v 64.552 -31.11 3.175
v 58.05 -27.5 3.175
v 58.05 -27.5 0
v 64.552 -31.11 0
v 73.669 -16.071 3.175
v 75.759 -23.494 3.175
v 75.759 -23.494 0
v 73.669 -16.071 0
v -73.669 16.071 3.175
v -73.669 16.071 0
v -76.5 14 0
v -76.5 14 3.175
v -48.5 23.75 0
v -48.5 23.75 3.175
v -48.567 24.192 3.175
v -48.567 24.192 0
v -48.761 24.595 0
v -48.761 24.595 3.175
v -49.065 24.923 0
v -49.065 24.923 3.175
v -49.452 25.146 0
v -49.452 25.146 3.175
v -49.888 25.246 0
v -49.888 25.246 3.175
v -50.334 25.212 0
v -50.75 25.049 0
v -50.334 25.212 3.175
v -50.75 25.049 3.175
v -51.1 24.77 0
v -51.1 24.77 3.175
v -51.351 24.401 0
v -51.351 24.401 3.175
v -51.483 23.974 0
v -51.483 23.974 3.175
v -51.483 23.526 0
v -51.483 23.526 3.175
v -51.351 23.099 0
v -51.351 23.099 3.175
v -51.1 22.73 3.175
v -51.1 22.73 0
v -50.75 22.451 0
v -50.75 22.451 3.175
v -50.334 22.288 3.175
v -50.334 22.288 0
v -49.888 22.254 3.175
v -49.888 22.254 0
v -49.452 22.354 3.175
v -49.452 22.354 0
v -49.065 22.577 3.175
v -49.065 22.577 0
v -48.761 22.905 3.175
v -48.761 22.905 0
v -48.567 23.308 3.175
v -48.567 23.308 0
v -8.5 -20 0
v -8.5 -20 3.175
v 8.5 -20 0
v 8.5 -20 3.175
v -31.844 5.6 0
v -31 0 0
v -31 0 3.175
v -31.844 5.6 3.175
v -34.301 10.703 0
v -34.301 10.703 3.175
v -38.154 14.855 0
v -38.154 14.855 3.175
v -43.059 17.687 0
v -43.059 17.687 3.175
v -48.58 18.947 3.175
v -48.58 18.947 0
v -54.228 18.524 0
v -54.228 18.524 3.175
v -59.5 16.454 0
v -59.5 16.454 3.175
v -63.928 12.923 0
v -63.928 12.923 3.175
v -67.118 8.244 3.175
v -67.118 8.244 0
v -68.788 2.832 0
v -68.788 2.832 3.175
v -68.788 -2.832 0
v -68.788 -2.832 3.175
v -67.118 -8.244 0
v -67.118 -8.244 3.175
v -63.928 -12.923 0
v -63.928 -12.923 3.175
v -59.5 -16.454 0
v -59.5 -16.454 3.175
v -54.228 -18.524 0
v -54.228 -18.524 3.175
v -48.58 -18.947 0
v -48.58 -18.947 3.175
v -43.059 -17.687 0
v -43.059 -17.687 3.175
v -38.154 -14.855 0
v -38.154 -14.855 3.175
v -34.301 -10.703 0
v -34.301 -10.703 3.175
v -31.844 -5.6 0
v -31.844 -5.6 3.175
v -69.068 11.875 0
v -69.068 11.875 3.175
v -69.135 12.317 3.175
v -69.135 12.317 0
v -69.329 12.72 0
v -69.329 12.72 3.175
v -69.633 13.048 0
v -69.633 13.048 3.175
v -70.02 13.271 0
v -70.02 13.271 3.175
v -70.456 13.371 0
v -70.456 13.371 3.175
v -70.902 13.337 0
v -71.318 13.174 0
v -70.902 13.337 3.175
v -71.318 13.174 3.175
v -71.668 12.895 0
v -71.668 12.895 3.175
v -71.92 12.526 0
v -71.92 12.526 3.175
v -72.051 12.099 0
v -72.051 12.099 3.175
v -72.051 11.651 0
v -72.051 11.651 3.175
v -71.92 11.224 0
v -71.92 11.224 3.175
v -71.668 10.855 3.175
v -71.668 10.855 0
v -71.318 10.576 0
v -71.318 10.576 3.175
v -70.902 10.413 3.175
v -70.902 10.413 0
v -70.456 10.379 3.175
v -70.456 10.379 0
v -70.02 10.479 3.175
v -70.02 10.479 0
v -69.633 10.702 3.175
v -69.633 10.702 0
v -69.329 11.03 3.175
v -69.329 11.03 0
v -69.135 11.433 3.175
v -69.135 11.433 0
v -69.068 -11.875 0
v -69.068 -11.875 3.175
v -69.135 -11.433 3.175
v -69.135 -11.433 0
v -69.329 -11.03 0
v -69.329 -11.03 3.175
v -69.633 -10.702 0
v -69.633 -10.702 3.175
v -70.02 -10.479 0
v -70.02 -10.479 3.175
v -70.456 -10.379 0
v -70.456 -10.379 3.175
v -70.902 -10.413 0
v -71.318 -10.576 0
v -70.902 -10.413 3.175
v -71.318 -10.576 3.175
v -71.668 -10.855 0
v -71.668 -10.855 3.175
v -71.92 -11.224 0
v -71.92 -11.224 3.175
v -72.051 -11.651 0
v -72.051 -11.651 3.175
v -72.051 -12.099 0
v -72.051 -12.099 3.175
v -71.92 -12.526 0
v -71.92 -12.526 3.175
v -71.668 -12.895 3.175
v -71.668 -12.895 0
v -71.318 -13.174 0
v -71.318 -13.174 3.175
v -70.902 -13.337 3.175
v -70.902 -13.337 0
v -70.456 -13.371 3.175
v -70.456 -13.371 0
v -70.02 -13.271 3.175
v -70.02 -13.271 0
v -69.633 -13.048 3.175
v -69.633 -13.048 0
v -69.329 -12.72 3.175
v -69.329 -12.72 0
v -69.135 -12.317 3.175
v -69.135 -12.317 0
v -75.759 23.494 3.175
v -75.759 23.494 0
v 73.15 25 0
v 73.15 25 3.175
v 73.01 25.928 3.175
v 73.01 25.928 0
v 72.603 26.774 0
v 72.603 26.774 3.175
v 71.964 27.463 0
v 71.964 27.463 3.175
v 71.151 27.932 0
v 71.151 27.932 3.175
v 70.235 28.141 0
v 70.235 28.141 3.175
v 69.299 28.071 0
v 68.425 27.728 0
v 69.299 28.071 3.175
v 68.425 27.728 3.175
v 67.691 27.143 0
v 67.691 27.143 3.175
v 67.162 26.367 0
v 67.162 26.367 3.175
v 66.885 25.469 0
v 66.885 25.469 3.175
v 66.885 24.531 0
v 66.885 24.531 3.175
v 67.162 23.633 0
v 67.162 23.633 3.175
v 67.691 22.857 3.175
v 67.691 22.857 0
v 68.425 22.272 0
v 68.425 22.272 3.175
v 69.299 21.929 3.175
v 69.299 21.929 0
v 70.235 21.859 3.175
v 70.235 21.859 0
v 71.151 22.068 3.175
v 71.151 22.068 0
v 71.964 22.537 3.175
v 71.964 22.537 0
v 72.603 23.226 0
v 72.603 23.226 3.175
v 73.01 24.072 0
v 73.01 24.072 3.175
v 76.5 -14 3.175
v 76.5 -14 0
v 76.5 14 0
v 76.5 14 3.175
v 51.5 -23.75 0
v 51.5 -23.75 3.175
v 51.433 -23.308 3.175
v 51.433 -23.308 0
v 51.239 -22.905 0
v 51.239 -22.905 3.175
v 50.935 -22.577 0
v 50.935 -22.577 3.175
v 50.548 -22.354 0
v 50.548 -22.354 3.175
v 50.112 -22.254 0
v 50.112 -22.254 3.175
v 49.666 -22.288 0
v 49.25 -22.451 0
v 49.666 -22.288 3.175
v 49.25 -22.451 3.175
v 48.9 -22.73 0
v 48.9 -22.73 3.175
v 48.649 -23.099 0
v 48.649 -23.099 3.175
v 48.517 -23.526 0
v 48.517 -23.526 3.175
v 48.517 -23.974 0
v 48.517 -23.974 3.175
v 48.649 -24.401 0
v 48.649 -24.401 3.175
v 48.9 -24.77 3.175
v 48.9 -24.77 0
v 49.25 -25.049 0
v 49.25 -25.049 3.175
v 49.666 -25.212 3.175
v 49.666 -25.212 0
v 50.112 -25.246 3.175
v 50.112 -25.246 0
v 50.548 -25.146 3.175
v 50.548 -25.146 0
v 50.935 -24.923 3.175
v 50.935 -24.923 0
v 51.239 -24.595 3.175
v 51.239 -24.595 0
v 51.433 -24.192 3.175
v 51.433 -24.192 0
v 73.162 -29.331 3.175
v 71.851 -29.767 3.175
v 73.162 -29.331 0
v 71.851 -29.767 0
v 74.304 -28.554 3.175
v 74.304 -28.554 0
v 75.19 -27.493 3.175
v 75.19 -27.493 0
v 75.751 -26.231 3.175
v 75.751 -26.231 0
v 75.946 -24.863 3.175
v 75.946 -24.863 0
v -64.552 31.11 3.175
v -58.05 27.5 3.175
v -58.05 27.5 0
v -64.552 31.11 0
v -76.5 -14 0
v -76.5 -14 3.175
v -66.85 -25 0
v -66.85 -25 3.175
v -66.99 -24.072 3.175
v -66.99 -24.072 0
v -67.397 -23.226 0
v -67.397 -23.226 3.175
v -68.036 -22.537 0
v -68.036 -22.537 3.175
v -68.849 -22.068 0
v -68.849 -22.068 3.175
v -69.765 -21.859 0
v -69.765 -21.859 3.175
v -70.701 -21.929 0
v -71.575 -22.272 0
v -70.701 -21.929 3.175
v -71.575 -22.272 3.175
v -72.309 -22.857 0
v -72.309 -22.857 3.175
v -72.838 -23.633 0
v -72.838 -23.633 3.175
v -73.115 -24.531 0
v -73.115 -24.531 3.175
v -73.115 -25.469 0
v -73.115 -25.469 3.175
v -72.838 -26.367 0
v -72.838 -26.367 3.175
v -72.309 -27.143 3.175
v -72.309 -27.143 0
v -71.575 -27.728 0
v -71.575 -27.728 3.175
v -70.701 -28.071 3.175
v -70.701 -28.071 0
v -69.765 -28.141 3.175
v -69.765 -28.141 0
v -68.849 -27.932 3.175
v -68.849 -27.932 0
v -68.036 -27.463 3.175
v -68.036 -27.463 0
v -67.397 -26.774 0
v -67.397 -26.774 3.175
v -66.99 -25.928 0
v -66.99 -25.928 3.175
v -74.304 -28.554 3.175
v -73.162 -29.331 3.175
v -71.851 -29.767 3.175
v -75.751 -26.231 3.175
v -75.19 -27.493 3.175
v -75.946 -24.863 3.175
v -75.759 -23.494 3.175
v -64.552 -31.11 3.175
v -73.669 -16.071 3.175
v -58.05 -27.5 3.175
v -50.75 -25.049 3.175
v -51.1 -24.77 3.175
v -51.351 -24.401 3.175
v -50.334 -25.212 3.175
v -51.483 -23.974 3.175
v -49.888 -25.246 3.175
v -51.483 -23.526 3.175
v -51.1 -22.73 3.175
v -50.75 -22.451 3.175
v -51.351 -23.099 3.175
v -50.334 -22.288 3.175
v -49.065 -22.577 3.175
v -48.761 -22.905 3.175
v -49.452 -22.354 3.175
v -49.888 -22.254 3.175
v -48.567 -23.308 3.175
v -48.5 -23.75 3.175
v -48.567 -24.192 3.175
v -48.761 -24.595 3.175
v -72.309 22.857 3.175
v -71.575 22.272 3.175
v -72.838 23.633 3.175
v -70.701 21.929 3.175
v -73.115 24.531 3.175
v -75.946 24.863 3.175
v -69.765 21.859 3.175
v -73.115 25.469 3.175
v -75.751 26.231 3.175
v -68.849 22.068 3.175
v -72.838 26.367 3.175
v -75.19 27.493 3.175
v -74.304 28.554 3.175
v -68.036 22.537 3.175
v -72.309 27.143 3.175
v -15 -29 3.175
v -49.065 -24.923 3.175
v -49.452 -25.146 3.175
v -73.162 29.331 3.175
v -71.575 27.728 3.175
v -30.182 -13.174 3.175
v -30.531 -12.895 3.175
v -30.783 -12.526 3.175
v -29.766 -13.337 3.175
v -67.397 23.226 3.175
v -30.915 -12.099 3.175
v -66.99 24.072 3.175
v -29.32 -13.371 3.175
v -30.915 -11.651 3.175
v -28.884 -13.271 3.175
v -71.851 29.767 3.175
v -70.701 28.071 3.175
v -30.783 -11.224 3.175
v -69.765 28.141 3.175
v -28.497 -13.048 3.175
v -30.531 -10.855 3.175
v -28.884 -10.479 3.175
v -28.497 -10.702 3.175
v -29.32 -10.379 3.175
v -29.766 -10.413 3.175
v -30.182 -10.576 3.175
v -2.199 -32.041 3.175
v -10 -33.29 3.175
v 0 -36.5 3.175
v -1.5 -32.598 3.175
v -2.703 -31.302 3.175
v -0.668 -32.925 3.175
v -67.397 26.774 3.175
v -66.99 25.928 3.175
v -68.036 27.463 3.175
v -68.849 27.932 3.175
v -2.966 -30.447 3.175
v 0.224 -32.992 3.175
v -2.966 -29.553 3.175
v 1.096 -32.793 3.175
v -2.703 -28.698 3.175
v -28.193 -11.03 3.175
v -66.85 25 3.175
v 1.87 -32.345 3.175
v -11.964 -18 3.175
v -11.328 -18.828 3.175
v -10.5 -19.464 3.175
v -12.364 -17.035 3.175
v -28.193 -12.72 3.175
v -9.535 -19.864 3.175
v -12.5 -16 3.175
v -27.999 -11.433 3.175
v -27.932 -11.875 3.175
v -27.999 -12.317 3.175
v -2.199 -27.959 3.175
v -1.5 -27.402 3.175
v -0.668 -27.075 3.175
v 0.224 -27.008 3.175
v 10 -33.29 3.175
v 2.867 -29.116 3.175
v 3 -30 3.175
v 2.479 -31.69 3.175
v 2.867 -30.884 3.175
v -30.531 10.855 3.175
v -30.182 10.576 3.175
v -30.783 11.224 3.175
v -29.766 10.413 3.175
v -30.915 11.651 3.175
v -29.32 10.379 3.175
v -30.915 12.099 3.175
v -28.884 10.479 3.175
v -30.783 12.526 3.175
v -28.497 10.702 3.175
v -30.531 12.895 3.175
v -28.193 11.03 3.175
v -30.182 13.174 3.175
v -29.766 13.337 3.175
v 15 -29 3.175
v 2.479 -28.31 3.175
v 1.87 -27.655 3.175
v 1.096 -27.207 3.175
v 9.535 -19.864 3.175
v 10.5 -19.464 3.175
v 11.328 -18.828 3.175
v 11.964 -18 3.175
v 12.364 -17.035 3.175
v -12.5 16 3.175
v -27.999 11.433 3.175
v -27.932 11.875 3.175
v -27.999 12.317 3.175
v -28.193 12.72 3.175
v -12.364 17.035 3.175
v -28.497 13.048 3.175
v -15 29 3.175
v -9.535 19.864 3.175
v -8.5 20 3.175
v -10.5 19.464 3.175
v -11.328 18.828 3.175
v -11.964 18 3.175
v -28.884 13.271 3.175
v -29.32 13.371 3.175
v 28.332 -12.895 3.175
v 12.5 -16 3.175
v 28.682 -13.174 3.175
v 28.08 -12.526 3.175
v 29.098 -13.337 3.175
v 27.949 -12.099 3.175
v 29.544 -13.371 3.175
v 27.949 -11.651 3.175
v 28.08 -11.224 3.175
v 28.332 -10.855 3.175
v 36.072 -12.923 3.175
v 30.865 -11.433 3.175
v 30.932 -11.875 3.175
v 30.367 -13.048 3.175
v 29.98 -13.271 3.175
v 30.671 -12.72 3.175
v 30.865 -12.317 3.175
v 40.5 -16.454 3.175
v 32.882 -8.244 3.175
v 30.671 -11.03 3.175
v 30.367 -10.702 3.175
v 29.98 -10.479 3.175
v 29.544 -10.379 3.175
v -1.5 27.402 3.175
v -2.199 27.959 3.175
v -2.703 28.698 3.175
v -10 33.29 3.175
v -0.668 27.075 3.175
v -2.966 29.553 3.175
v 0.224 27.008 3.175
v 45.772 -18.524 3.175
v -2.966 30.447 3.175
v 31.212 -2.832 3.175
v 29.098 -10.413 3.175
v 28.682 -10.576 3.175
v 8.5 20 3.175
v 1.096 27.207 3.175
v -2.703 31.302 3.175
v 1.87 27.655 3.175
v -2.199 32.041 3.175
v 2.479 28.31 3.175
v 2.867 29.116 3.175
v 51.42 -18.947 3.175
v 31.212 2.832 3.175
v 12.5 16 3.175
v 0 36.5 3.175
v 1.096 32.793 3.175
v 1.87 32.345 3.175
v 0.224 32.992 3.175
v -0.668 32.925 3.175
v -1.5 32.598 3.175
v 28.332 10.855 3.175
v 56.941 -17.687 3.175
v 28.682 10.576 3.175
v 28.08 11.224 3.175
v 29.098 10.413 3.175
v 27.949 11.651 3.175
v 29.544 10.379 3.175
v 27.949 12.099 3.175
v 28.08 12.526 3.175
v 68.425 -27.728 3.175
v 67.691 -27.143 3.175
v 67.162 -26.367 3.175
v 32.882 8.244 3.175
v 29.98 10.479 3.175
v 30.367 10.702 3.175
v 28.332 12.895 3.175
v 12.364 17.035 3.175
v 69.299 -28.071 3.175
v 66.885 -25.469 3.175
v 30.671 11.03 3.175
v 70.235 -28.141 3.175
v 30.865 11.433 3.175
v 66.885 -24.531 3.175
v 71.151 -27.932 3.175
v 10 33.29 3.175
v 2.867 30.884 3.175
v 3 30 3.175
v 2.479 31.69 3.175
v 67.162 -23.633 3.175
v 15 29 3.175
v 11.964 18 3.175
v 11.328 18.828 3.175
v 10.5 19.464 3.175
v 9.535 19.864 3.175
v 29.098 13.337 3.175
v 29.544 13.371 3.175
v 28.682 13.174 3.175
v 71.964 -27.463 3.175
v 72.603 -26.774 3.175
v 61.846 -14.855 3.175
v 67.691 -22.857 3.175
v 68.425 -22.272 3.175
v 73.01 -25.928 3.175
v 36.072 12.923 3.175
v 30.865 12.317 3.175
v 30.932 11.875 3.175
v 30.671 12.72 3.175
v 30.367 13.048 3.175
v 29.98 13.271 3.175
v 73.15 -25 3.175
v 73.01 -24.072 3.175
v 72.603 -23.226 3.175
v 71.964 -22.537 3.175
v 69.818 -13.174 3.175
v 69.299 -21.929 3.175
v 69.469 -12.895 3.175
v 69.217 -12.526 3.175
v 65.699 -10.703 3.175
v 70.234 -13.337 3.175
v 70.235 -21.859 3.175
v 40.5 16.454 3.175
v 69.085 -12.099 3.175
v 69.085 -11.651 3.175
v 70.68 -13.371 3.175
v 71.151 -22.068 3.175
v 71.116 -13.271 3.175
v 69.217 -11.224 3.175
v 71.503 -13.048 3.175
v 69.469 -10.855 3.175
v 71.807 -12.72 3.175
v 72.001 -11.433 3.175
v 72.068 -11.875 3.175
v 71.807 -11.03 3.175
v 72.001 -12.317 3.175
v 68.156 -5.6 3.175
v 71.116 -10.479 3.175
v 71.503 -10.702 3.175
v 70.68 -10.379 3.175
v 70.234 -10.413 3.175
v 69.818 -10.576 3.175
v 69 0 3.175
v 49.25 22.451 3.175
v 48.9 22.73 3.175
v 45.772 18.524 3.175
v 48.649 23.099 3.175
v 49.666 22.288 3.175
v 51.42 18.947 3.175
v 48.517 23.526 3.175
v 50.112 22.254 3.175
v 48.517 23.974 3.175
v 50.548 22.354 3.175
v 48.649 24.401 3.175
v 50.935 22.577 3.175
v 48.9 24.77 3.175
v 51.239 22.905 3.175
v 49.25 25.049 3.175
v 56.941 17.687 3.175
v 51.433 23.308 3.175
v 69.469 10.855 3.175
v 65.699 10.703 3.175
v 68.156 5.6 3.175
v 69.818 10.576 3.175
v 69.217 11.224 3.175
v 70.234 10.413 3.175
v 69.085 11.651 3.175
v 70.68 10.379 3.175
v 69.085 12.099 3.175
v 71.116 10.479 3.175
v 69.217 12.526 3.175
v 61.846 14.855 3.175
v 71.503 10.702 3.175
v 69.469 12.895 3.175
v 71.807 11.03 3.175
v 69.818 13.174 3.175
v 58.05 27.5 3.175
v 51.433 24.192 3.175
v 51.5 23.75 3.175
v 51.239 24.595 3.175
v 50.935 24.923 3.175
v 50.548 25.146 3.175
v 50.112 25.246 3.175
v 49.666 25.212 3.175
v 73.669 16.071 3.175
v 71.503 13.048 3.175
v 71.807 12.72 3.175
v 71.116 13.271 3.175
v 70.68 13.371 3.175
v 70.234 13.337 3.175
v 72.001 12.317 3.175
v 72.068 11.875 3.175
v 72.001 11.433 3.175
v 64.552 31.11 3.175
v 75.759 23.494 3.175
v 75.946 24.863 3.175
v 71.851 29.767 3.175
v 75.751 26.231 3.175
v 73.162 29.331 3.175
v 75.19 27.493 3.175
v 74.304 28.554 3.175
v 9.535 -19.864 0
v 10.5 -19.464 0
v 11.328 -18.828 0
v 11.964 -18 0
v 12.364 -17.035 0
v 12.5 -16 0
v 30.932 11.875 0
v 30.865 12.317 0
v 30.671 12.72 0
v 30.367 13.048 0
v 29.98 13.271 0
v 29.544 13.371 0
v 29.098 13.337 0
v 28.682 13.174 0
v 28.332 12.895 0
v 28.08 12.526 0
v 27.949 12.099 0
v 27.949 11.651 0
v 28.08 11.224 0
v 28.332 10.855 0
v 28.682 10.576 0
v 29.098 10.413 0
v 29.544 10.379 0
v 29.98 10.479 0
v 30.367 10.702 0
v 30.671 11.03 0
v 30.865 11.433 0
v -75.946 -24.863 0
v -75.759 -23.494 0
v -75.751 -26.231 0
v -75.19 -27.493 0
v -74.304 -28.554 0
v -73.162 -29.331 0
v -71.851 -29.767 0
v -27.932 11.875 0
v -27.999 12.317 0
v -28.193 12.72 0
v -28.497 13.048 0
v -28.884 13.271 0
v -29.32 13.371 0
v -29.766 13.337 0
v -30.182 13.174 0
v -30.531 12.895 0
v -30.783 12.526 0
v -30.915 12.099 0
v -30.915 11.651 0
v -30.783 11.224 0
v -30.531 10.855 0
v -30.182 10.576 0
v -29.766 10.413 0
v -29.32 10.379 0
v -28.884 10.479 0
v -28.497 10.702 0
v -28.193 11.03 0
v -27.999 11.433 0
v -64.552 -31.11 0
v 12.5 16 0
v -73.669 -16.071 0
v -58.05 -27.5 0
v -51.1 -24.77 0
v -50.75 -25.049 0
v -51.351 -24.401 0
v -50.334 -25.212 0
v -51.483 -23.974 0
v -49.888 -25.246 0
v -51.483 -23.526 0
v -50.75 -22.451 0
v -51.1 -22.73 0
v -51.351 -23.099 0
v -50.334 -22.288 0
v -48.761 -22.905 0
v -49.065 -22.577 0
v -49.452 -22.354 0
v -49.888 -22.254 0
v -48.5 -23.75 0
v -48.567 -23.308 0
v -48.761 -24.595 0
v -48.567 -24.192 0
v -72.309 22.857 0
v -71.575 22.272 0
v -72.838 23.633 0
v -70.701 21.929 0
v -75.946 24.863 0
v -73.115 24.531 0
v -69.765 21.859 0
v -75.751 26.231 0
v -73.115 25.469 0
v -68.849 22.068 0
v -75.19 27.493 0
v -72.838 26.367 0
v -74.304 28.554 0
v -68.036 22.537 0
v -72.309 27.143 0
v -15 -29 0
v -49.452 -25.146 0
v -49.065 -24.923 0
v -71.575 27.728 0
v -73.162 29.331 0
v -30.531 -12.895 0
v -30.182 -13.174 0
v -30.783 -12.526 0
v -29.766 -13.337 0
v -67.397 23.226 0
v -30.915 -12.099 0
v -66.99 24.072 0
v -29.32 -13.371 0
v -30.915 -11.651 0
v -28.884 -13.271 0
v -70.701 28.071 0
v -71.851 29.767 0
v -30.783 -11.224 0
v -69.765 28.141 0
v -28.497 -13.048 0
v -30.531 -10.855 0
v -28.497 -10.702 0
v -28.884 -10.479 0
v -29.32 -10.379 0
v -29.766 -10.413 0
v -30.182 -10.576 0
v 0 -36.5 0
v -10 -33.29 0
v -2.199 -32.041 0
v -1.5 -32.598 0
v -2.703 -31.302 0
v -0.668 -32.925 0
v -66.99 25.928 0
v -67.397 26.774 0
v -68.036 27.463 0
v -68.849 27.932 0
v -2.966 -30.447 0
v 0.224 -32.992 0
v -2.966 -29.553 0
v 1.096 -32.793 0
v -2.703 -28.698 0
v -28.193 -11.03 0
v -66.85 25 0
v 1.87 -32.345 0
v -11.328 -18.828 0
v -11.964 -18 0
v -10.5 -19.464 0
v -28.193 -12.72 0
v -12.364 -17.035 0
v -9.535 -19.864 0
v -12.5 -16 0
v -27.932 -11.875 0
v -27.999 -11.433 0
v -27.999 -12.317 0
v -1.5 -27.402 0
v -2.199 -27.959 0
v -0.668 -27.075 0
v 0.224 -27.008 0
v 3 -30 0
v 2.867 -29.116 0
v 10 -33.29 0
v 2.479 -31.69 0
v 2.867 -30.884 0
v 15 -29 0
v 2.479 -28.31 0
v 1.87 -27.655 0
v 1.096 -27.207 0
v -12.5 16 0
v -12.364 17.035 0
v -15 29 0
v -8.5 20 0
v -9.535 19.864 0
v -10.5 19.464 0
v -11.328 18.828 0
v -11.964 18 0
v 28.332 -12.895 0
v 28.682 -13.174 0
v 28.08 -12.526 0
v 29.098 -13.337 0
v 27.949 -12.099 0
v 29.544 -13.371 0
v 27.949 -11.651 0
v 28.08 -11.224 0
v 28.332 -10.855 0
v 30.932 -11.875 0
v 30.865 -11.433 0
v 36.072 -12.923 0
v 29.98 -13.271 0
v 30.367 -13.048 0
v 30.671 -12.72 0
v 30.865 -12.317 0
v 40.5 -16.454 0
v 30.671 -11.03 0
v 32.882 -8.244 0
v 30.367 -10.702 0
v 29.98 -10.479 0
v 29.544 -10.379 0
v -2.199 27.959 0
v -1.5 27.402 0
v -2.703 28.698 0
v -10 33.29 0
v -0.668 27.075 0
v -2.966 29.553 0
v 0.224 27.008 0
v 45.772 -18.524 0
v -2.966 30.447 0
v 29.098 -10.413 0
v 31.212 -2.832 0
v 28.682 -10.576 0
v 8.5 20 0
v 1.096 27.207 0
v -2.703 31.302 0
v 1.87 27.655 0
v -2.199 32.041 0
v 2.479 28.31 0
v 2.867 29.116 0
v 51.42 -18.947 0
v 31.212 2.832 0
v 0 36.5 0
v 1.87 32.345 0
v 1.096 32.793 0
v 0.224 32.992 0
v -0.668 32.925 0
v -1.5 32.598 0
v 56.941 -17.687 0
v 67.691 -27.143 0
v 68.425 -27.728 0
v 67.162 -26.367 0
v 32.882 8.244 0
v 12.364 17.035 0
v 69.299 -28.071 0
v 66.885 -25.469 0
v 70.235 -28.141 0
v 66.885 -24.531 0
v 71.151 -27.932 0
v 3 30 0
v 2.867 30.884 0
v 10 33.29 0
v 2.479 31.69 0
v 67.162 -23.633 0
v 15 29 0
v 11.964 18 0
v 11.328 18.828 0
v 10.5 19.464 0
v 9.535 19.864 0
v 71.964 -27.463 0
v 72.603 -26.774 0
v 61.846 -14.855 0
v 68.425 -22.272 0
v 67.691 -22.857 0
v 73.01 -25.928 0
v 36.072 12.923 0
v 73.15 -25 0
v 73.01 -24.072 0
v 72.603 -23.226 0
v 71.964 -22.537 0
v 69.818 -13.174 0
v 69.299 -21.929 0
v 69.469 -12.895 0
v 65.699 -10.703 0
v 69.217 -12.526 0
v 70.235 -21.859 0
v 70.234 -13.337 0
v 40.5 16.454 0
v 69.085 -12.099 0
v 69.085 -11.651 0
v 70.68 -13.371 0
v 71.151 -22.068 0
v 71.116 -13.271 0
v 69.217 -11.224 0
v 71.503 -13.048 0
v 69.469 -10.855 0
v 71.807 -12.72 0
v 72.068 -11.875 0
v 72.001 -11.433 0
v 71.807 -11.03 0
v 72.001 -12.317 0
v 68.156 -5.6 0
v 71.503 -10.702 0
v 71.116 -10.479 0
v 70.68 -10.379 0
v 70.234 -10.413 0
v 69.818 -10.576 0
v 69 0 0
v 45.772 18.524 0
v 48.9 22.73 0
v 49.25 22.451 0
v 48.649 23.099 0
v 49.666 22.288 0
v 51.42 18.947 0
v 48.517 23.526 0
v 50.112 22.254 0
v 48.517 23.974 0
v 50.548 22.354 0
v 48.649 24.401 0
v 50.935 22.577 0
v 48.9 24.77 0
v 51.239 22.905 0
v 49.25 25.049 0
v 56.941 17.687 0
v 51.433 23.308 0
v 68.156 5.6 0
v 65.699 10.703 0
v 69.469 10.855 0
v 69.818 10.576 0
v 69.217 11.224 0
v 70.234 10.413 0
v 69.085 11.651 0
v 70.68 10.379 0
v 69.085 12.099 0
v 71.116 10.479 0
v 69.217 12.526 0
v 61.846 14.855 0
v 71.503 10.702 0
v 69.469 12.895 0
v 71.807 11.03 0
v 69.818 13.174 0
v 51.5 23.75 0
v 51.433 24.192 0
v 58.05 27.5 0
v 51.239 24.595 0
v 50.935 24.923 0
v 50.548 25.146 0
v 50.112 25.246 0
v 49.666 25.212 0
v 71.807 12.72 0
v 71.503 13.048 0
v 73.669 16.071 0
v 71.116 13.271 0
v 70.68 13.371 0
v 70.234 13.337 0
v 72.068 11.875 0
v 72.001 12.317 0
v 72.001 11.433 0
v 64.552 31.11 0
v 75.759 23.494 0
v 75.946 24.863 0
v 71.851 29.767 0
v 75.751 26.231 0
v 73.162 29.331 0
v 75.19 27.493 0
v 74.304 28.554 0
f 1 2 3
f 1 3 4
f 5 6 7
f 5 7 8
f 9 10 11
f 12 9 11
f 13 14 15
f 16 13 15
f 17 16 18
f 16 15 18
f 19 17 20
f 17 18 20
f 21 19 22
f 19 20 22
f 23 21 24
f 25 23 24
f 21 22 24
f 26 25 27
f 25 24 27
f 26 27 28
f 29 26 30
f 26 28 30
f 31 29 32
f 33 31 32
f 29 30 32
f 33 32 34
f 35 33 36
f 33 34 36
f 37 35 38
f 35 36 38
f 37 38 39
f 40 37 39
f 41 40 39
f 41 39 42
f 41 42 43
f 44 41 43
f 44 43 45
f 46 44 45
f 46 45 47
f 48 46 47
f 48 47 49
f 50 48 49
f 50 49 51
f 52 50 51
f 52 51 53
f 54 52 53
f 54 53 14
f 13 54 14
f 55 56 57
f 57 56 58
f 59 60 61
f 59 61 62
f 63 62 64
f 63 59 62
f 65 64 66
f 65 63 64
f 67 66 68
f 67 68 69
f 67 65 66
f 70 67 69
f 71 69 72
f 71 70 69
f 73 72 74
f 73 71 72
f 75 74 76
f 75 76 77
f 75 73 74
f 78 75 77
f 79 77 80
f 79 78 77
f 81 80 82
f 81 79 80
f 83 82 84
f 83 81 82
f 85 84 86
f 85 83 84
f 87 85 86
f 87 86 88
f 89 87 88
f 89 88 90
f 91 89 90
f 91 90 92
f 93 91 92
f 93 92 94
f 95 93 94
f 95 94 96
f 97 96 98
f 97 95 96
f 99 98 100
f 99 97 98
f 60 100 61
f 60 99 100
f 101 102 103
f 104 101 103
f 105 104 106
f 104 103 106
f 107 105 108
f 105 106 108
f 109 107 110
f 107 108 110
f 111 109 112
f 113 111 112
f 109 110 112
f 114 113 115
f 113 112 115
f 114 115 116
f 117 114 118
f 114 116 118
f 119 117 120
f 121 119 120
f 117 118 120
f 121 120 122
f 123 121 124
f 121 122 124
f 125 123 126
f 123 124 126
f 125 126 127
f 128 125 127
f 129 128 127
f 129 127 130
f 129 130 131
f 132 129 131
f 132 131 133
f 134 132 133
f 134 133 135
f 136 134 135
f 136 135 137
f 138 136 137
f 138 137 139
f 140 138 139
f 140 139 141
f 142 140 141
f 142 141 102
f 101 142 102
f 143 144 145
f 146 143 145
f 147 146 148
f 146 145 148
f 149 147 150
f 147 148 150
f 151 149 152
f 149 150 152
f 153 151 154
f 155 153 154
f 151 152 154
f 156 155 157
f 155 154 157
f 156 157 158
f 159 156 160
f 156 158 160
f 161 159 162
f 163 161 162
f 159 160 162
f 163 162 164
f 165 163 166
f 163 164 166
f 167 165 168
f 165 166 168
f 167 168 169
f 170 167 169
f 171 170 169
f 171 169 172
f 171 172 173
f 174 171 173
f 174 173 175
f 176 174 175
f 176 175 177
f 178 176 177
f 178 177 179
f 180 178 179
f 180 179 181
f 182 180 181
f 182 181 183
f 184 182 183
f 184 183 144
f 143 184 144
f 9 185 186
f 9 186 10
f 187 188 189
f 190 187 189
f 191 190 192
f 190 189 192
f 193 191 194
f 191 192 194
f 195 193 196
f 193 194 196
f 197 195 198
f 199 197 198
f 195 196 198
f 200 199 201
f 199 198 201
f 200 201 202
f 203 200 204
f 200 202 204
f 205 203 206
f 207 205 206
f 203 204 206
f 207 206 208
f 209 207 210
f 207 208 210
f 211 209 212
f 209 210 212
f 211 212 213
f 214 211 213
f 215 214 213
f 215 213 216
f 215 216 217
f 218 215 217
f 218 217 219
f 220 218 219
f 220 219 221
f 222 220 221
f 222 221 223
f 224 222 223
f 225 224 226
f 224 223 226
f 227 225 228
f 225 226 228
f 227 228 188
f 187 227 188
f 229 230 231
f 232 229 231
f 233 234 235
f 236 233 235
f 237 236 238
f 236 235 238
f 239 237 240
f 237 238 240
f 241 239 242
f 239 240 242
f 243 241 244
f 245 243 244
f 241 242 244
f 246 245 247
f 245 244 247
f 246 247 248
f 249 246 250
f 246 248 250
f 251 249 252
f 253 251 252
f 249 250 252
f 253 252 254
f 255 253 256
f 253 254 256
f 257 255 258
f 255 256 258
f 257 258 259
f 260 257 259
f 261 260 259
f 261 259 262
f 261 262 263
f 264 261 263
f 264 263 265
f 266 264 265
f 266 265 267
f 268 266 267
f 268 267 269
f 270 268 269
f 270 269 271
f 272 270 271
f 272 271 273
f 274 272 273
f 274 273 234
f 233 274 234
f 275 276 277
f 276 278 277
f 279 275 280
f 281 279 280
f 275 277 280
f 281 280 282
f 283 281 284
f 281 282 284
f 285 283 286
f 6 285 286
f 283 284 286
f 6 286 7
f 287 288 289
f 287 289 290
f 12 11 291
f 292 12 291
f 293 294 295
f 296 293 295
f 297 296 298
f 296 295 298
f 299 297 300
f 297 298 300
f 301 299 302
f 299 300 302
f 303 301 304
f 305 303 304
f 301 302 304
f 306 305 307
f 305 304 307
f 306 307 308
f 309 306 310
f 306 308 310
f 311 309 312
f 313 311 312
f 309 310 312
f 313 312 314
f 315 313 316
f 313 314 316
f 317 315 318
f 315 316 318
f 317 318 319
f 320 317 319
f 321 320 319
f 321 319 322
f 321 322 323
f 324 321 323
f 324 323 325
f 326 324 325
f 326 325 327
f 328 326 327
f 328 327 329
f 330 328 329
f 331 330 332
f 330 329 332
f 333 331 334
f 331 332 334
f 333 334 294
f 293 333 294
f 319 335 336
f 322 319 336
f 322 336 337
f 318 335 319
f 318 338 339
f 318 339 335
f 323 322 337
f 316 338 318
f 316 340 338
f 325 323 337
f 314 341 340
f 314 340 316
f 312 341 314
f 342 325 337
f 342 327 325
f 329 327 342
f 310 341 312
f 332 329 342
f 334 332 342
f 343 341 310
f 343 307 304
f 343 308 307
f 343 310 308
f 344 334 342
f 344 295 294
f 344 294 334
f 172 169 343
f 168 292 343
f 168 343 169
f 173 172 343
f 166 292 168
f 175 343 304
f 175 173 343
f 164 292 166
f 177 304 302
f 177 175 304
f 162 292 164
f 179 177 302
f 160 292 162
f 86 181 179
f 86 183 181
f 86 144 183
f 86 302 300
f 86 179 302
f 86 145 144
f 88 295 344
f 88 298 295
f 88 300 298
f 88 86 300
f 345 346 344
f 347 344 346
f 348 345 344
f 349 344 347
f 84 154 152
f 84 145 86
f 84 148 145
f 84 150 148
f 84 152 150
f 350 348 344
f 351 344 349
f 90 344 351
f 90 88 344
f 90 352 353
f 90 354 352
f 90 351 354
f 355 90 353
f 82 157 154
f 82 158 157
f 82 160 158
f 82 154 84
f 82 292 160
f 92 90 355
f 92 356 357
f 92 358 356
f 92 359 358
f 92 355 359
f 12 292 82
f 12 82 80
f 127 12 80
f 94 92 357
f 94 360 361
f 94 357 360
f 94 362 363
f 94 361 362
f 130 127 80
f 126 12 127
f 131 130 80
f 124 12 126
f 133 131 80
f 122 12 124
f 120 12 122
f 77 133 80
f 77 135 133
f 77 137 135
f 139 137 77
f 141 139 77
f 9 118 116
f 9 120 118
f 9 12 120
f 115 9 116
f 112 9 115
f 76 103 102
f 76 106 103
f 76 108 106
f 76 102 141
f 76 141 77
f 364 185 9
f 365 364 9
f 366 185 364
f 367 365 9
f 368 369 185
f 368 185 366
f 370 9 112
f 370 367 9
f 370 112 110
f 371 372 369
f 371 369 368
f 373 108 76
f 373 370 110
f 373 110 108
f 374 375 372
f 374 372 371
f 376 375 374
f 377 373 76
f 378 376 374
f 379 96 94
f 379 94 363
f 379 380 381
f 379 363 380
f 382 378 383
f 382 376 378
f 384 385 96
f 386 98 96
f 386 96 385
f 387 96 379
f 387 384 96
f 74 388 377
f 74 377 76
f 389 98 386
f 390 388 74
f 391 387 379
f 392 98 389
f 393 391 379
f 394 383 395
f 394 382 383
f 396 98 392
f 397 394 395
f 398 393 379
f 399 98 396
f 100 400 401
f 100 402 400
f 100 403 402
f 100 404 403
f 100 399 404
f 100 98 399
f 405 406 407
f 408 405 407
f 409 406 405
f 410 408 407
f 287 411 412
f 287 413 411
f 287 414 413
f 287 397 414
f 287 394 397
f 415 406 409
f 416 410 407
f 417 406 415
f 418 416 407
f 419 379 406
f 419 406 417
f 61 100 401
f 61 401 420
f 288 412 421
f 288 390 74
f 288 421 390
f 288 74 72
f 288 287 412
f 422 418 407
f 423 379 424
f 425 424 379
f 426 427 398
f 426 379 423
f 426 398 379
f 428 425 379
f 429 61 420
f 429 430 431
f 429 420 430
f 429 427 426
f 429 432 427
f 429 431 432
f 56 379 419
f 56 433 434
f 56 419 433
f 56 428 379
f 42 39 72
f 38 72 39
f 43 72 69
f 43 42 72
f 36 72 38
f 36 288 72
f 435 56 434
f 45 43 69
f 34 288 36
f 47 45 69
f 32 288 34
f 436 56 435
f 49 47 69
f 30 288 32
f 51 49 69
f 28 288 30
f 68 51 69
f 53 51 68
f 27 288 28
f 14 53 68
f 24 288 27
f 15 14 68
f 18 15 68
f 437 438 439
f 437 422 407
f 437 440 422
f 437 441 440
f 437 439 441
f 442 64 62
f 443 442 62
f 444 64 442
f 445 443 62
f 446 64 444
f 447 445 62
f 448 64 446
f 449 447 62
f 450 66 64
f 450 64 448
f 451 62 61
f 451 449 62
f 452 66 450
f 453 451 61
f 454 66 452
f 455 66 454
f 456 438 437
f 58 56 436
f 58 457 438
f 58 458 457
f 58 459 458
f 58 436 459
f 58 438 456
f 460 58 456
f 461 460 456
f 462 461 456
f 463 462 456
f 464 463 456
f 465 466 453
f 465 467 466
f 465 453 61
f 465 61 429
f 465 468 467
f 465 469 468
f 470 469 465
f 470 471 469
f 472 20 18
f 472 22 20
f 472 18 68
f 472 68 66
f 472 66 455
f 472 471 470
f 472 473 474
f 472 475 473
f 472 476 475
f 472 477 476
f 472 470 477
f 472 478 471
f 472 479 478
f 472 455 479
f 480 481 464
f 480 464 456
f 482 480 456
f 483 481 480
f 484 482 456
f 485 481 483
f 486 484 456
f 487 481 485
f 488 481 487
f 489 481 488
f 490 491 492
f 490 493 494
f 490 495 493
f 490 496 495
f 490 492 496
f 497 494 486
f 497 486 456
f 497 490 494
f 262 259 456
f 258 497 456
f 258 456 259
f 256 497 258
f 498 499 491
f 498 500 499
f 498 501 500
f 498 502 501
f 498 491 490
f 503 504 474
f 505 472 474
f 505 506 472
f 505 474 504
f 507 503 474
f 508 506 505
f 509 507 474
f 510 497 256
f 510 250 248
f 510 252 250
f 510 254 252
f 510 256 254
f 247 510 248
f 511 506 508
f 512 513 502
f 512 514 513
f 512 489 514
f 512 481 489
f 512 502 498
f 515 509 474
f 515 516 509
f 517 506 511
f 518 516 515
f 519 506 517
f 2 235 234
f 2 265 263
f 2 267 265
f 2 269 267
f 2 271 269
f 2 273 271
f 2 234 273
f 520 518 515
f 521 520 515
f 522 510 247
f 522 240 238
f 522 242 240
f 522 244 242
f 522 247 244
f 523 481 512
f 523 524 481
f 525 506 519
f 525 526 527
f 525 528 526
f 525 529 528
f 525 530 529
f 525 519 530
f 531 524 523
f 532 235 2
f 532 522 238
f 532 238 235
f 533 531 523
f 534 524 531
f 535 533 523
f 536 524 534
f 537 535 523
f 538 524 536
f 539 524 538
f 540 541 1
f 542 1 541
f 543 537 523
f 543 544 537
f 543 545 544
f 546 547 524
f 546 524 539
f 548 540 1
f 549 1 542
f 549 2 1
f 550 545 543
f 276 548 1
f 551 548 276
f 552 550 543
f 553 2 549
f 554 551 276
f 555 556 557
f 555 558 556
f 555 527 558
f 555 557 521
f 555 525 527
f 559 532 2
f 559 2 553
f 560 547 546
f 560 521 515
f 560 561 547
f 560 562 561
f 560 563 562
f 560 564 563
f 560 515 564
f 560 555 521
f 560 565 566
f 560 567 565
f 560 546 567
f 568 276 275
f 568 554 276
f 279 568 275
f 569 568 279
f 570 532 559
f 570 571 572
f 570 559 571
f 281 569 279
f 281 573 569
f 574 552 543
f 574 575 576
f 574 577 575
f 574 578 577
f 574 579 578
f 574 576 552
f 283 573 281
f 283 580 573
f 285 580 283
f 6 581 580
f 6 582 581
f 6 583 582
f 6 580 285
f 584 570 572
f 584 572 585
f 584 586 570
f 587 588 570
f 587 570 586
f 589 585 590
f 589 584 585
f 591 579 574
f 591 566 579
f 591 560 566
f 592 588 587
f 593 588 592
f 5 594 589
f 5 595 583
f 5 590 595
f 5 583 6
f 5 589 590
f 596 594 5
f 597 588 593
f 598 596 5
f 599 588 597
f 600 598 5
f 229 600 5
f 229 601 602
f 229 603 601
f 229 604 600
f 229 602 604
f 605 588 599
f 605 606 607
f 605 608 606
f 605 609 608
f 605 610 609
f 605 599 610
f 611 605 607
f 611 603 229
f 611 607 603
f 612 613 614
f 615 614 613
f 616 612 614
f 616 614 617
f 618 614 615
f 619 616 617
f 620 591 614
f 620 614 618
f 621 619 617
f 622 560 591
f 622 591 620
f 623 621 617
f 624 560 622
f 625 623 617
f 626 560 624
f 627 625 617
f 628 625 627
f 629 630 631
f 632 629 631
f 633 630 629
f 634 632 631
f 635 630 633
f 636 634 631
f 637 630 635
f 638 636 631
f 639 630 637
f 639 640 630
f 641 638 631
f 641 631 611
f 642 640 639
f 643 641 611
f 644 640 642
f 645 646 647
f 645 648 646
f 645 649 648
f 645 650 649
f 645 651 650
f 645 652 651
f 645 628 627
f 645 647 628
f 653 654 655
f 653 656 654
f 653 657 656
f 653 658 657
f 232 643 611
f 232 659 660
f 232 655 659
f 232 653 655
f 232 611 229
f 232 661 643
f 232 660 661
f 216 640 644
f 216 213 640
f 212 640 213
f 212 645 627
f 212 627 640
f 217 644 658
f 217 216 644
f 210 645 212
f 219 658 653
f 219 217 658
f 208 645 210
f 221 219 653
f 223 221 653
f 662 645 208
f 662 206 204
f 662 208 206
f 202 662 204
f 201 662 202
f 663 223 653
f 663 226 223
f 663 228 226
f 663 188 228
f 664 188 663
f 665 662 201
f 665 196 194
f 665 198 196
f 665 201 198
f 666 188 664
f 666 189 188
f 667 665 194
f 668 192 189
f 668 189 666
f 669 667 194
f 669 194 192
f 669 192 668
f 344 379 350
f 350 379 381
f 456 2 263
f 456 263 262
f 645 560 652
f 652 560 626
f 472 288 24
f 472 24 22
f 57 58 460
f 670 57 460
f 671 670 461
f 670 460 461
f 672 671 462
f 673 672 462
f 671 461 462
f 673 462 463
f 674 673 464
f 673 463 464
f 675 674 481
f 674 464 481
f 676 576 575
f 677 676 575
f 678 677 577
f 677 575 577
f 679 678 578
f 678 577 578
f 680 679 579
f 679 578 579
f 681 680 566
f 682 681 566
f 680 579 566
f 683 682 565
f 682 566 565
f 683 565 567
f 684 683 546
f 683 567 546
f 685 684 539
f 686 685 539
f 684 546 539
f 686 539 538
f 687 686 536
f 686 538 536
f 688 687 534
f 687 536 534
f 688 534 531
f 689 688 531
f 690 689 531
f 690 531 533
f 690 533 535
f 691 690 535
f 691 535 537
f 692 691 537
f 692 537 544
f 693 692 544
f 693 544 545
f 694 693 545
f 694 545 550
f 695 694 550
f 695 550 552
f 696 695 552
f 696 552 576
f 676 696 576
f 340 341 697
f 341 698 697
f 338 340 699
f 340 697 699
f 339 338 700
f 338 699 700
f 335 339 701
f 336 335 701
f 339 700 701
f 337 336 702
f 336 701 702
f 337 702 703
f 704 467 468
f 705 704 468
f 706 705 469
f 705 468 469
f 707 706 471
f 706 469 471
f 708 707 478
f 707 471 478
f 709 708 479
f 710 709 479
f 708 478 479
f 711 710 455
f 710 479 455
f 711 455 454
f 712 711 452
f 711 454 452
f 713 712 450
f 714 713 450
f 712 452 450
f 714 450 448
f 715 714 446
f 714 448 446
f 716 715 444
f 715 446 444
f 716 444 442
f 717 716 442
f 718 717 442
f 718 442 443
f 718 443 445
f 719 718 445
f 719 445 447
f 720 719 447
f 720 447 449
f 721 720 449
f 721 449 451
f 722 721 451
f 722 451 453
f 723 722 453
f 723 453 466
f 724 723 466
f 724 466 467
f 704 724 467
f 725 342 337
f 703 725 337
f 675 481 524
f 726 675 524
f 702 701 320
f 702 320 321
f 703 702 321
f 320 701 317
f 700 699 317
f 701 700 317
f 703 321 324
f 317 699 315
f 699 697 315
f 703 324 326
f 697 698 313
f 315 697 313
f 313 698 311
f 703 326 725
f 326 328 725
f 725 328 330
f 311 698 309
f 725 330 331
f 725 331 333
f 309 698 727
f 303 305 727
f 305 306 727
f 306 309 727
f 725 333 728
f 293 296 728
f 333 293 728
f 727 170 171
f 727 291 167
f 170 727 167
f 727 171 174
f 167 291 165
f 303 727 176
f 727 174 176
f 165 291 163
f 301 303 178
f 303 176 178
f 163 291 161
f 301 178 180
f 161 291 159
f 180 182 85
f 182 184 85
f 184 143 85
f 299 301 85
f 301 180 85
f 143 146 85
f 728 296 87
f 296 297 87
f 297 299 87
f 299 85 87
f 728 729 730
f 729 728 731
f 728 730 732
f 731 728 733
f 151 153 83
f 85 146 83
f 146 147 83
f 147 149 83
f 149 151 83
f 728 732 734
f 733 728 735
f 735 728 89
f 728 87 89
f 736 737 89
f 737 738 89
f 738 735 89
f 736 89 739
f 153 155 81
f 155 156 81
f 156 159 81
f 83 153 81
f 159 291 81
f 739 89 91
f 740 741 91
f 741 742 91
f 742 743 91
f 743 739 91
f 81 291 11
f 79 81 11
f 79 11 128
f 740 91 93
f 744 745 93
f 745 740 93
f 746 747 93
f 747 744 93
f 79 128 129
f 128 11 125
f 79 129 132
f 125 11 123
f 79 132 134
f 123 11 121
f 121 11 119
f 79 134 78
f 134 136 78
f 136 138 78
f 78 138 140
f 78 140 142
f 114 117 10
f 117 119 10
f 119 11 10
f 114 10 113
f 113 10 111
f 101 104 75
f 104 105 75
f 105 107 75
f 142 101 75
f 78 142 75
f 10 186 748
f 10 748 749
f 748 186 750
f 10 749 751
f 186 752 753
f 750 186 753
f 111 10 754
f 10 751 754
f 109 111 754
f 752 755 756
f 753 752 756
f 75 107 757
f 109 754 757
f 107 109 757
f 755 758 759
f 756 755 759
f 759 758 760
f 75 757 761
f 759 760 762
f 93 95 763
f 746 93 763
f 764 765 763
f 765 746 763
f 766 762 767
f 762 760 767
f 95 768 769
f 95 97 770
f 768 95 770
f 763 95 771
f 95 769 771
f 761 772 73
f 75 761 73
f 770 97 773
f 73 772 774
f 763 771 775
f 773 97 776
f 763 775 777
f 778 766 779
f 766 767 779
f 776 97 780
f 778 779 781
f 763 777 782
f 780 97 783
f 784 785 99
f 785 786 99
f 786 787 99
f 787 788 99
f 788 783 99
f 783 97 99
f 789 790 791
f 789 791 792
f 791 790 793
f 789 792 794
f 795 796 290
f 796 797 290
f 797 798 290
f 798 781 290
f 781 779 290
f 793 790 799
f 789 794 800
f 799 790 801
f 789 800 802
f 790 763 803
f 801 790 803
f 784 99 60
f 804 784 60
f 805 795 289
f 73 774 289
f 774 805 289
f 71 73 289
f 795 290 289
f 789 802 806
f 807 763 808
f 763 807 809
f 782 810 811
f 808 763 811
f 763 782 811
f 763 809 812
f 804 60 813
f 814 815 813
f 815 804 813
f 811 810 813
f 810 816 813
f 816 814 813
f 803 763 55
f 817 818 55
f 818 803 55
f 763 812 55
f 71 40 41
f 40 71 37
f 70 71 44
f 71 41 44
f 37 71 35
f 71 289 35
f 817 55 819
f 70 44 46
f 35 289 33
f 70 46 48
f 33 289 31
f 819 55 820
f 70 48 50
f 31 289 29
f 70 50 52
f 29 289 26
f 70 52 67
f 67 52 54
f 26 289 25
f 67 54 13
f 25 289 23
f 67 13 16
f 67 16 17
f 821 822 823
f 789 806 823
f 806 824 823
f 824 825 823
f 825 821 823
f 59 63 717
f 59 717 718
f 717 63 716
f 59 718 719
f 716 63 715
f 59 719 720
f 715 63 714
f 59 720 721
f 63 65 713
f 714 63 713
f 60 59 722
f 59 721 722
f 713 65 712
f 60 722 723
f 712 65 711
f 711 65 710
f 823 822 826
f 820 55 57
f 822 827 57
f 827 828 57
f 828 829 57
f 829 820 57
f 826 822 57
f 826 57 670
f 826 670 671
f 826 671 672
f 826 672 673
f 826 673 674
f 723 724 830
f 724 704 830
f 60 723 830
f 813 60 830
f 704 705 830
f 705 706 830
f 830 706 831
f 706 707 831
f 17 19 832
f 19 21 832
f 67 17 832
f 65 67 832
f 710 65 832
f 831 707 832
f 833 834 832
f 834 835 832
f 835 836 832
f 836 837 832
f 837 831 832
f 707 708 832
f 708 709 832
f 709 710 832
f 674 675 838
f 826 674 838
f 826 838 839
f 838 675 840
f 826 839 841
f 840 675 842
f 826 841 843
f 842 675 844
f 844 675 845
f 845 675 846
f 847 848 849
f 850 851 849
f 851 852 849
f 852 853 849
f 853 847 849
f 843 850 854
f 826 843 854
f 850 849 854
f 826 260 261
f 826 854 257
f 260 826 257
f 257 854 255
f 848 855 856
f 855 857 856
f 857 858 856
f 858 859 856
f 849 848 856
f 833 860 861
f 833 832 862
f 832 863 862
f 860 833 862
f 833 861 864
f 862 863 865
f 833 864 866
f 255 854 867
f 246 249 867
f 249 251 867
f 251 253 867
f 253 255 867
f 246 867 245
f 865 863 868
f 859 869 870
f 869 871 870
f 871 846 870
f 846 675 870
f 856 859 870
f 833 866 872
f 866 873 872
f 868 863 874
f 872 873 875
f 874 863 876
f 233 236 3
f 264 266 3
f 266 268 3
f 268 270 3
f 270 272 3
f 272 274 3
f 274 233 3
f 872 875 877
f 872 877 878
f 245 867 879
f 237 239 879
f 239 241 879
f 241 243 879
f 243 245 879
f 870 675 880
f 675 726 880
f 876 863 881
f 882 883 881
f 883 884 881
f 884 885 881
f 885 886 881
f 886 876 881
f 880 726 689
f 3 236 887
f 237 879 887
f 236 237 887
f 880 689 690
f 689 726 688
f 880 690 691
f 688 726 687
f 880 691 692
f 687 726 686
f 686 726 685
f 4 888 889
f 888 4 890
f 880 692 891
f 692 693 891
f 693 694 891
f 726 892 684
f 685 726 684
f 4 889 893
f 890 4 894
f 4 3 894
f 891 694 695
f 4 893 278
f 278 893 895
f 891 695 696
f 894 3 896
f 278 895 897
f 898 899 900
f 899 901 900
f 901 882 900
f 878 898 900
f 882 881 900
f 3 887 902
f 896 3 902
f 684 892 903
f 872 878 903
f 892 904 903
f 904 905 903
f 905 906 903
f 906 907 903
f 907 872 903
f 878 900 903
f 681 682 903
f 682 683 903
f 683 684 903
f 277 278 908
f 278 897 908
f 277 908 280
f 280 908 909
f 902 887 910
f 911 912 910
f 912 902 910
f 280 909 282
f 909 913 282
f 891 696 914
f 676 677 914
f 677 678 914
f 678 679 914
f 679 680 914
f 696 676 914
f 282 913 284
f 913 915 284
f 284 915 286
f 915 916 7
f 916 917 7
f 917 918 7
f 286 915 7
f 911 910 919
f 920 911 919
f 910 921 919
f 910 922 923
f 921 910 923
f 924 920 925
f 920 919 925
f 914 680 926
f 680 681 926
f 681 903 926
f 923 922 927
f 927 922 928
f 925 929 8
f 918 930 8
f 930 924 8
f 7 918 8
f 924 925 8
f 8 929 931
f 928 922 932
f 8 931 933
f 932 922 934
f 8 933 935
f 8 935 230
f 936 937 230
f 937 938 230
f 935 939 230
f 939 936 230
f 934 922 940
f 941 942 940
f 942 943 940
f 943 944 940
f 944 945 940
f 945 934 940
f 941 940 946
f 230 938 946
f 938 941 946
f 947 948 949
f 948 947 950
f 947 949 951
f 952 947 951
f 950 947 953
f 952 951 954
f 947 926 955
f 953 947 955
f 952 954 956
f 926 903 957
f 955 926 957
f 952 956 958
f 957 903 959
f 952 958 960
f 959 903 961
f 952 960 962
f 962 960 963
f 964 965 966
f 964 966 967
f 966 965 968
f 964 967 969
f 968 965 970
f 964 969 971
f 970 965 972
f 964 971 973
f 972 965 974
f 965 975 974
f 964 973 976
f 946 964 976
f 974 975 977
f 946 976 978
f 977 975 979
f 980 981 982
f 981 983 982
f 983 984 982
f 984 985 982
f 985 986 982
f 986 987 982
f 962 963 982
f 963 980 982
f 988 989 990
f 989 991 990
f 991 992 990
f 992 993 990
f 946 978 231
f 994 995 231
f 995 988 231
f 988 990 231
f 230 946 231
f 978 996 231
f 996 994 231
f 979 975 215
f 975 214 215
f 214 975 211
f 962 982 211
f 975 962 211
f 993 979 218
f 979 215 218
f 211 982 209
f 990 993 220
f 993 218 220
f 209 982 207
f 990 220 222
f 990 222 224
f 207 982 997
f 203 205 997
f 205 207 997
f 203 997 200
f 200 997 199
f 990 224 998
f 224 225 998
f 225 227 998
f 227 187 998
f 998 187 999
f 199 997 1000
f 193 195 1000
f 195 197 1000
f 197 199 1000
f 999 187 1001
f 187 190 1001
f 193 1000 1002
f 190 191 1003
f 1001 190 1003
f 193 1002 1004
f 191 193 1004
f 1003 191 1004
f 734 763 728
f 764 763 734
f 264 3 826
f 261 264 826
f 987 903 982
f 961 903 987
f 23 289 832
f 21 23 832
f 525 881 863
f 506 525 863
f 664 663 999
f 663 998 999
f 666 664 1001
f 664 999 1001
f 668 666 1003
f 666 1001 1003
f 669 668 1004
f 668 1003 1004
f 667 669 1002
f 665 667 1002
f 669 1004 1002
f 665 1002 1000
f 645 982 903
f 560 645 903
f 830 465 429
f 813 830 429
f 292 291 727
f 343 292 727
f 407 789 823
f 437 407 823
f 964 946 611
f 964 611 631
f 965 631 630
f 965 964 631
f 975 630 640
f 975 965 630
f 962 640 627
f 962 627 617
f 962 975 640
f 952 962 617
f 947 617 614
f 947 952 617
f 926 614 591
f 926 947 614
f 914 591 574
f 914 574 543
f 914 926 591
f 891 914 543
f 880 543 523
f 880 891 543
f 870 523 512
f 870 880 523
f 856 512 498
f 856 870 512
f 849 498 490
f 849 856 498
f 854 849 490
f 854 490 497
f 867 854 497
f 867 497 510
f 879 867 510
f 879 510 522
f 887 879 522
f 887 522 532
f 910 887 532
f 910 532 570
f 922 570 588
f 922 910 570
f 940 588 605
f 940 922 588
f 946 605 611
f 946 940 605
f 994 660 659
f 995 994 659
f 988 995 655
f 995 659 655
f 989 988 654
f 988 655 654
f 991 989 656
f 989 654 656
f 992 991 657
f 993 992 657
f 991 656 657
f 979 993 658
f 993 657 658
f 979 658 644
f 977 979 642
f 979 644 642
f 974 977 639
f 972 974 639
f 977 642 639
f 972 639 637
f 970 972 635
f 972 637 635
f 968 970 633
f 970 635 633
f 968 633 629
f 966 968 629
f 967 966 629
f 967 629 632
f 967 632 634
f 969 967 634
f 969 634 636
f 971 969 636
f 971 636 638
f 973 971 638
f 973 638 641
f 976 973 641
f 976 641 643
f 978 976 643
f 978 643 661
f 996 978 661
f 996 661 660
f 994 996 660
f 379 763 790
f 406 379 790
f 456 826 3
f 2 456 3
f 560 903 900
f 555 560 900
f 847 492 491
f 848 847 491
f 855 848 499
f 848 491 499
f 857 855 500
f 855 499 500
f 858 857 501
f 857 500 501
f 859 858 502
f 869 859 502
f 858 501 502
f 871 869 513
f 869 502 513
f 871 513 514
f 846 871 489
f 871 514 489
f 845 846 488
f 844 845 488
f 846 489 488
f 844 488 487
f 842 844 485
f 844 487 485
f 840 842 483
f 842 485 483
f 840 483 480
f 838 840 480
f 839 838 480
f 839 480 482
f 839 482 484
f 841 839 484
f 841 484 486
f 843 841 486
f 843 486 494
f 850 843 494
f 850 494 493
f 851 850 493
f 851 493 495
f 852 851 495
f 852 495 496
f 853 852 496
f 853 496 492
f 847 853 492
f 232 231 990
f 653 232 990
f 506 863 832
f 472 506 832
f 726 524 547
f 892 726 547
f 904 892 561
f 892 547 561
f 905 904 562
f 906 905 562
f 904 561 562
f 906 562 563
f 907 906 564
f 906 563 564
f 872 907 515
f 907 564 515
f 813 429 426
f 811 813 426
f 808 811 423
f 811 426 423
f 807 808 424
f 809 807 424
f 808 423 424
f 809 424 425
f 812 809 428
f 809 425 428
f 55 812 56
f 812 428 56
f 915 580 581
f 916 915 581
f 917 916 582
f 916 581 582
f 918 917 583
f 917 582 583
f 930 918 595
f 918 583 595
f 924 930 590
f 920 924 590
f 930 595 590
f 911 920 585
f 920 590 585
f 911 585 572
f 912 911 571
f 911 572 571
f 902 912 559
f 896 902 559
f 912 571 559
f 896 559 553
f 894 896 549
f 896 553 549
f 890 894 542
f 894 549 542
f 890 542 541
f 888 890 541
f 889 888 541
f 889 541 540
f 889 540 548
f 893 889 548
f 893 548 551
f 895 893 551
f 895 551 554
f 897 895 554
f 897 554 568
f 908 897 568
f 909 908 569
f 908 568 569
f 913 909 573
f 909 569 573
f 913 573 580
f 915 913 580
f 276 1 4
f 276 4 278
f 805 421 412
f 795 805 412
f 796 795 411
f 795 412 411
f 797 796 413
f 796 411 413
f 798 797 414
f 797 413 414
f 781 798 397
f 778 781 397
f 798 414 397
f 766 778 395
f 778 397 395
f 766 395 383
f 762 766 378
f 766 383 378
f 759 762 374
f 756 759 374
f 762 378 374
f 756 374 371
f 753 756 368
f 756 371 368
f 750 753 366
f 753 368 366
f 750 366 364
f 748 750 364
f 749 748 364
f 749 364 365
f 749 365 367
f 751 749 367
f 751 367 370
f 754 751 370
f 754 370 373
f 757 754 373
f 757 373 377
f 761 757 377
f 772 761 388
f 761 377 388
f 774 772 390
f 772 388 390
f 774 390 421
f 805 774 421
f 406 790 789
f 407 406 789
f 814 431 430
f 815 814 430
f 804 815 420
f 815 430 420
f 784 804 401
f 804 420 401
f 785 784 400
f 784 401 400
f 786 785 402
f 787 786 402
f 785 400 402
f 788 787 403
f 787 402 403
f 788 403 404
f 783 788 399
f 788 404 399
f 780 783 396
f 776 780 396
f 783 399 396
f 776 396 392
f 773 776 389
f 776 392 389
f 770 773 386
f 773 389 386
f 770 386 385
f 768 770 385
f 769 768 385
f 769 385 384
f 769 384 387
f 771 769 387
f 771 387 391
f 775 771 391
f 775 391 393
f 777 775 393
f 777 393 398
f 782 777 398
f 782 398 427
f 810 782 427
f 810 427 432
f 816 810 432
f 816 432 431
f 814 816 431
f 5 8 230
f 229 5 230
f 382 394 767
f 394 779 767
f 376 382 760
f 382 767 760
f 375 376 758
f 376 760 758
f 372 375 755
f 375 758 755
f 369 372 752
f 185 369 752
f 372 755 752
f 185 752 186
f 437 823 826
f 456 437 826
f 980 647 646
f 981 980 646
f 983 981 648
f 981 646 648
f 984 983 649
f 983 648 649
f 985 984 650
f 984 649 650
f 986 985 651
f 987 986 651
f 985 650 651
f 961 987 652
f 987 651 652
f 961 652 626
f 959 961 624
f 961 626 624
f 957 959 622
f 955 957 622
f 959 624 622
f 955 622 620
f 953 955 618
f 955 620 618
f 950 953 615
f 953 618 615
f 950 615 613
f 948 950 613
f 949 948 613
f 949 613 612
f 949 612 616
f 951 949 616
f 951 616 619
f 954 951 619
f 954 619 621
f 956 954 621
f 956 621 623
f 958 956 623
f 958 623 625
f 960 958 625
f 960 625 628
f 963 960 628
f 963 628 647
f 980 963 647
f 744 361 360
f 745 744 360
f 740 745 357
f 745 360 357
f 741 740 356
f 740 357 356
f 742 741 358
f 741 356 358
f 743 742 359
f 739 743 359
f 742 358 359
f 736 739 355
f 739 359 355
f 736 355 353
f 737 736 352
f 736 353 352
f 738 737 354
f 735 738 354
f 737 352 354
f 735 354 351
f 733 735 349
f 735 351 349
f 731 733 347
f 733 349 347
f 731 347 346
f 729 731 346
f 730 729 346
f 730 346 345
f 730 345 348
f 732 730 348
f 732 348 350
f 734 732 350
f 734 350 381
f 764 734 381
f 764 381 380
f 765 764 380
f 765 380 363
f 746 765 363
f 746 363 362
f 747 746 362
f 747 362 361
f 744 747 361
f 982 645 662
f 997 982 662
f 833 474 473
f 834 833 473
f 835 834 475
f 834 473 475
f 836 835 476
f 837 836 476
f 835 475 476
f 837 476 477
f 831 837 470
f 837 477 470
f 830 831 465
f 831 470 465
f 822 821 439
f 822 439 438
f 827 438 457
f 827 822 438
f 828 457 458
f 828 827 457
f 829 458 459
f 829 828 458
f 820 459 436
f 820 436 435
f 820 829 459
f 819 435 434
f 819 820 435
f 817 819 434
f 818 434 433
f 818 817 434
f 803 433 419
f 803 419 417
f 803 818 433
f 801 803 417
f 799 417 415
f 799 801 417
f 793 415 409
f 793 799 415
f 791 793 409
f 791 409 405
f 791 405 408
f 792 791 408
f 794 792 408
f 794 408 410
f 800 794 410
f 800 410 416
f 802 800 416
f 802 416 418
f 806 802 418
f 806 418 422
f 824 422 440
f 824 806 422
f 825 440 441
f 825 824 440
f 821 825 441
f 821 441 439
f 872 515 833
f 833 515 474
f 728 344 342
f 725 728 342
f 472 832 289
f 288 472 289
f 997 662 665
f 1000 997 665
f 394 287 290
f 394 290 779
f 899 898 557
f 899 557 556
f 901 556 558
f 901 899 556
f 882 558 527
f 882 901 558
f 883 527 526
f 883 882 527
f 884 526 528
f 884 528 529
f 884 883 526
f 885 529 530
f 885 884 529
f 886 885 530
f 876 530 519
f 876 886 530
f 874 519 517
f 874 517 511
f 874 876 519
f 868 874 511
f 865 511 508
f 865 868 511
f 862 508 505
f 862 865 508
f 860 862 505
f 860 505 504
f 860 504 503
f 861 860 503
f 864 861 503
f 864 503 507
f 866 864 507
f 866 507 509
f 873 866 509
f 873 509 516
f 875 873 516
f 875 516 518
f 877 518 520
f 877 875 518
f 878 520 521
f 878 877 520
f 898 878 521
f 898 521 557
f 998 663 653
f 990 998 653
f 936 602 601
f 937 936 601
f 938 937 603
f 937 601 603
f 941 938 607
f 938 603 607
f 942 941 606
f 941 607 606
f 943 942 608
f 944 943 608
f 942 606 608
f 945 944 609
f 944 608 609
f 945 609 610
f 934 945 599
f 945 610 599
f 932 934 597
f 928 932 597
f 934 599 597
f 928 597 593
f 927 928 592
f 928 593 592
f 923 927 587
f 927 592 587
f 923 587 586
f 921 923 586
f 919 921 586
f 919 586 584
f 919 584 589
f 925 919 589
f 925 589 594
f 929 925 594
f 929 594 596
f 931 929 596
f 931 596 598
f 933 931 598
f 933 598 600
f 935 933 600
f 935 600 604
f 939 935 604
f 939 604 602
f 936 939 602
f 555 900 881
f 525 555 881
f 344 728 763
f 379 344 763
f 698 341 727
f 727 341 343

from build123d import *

# Parameters (mm, degrees)
SKETCH1_R           = 3
SKETCH1_R_2         = 19
BOSS_EXTRUDE1_DEPTH = 3.175
CUT_EXTRUDE1_DEPTH  = 4.175
SKETCH3_R           = 3.15
BOSS_EXTRUDE2_DEPTH = 3.175
FILLET1_R           = 5
SKETCH4_R           = 1.5
CUT_EXTRUDE2_DEPTH  = 4.175


with BuildPart() as part:
    # Sketch1 → Boss-Extrude1 (new body)
    with BuildSketch(Plane.XY):
        Polygon((0, 36.5), (-10, 33.28960264), (-15, 29), (-58.05, 27.5), (-76.5, 14), (-76.5, -14), (-58.05, -27.5), (-15, -29), (-10, -33.28960264), (0, -36.5), (10, -33.28960264), (15, -29), (58.05, -27.5), (76.5, -14), (76.5, 14), (58.05, 27.5), (15, 29), (10, 33.28960264), align=None)
        with Locations((0, 30)):
            Circle(SKETCH1_R, mode=Mode.SUBTRACT)
        with Locations((-50, 0)):
            Circle(SKETCH1_R_2, mode=Mode.SUBTRACT)
        with Locations((50, 0)):
            Circle(SKETCH1_R_2, mode=Mode.SUBTRACT)
        with Locations((0, -30)):
            Circle(SKETCH1_R, mode=Mode.SUBTRACT)
    extrude(amount=BOSS_EXTRUDE1_DEPTH)

    # Sketch2 → Cut-Extrude1 (cut, through all)
    with BuildSketch(Plane.XY.offset(3.175)):
        with BuildLine():
            Line((8.5, 20), (-8.5, 20))
            ThreePointArc((-8.5, 20), (-11.328427125, 18.828427125), (-12.5, 16))
            Line((-12.5, 16), (-12.5, -16))
            ThreePointArc((-12.5, -16), (-11.328427125, -18.828427125), (-8.5, -20))
            Line((-8.5, -20), (8.5, -20))
            ThreePointArc((8.5, -20), (11.328427125, -18.828427125), (12.5, -16))
            Line((12.5, -16), (12.5, 16))
            ThreePointArc((12.5, 16), (11.328427125, 18.828427125), (8.5, 20))
        make_face()
    extrude(amount=-CUT_EXTRUDE1_DEPTH, mode=Mode.SUBTRACT)

    # Sketch3 → Boss-Extrude2 (add)
    with BuildSketch(Plane.XY.offset(3.175)):
        Polygon((-58.05, 27.5), (-64.551915182, 31.10998542), (-77.245081729, 28.773819798), (-73.669390597, 16.071177612), align=None)
        with Locations((-70, 25)):
            Circle(SKETCH3_R, mode=Mode.SUBTRACT)
        Polygon((73.669390597, 16.071177612), (58.05, 27.5), (64.551915182, 31.10998542), (77.245081729, 28.773819798), align=None)
        with Locations((70, 25)):
            Circle(SKETCH3_R, mode=Mode.SUBTRACT)
        Polygon((58.05, -27.5), (64.551915182, -31.10998542), (77.245081729, -28.773819798), (73.669390597, -16.071177612), align=None)
        with Locations((70, -25)):
            Circle(SKETCH3_R, mode=Mode.SUBTRACT)
        Polygon((-73.669390597, -16.071177612), (-58.05, -27.5), (-64.551915182, -31.10998542), (-77.245081729, -28.773819798), align=None)
        with Locations((-70, -25)):
            Circle(SKETCH3_R, mode=Mode.SUBTRACT)
    extrude(amount=-BOSS_EXTRUDE2_DEPTH)

    # Fillet1
    fillet1_edges = [part.edges().sort_by_distance(p)[0] for p in [
        (77.245081729, 28.773819798, 1.5875),
        (77.245081729, -28.773819798, 1.5875),
        (-77.245081729, -28.773819798, 1.5875),
        (-77.245081729, 28.773819798, 1.5875),
    ]]
    fillet(fillet1_edges, radius=FILLET1_R)

    # Sketch4 → Cut-Extrude2 (cut, through all)
    with BuildSketch(Plane.XY.offset(3.175)):
        with Locations((-50, 23.75)):
            Circle(SKETCH4_R)
        with Locations((-70.56810334, 11.875)):
            Circle(SKETCH4_R)
        with Locations((-70.56810334, -11.875)):
            Circle(SKETCH4_R)
        with Locations((-50, -23.75)):
            Circle(SKETCH4_R)
        with Locations((-29.43189666, -11.875)):
            Circle(SKETCH4_R)
        with Locations((-29.43189666, 11.875)):
            Circle(SKETCH4_R)
        with Locations((29.43189666, 11.875)):
            Circle(SKETCH4_R)
        with Locations((29.43189666, -11.875)):
            Circle(SKETCH4_R)
        with Locations((50, -23.75)):
            Circle(SKETCH4_R)
        with Locations((70.56810334, -11.875)):
            Circle(SKETCH4_R)
        with Locations((70.56810334, 11.875)):
            Circle(SKETCH4_R)
        with Locations((50, 23.75)):
            Circle(SKETCH4_R)
    extrude(amount=-CUT_EXTRUDE2_DEPTH, mode=Mode.SUBTRACT)


solid = part.part
